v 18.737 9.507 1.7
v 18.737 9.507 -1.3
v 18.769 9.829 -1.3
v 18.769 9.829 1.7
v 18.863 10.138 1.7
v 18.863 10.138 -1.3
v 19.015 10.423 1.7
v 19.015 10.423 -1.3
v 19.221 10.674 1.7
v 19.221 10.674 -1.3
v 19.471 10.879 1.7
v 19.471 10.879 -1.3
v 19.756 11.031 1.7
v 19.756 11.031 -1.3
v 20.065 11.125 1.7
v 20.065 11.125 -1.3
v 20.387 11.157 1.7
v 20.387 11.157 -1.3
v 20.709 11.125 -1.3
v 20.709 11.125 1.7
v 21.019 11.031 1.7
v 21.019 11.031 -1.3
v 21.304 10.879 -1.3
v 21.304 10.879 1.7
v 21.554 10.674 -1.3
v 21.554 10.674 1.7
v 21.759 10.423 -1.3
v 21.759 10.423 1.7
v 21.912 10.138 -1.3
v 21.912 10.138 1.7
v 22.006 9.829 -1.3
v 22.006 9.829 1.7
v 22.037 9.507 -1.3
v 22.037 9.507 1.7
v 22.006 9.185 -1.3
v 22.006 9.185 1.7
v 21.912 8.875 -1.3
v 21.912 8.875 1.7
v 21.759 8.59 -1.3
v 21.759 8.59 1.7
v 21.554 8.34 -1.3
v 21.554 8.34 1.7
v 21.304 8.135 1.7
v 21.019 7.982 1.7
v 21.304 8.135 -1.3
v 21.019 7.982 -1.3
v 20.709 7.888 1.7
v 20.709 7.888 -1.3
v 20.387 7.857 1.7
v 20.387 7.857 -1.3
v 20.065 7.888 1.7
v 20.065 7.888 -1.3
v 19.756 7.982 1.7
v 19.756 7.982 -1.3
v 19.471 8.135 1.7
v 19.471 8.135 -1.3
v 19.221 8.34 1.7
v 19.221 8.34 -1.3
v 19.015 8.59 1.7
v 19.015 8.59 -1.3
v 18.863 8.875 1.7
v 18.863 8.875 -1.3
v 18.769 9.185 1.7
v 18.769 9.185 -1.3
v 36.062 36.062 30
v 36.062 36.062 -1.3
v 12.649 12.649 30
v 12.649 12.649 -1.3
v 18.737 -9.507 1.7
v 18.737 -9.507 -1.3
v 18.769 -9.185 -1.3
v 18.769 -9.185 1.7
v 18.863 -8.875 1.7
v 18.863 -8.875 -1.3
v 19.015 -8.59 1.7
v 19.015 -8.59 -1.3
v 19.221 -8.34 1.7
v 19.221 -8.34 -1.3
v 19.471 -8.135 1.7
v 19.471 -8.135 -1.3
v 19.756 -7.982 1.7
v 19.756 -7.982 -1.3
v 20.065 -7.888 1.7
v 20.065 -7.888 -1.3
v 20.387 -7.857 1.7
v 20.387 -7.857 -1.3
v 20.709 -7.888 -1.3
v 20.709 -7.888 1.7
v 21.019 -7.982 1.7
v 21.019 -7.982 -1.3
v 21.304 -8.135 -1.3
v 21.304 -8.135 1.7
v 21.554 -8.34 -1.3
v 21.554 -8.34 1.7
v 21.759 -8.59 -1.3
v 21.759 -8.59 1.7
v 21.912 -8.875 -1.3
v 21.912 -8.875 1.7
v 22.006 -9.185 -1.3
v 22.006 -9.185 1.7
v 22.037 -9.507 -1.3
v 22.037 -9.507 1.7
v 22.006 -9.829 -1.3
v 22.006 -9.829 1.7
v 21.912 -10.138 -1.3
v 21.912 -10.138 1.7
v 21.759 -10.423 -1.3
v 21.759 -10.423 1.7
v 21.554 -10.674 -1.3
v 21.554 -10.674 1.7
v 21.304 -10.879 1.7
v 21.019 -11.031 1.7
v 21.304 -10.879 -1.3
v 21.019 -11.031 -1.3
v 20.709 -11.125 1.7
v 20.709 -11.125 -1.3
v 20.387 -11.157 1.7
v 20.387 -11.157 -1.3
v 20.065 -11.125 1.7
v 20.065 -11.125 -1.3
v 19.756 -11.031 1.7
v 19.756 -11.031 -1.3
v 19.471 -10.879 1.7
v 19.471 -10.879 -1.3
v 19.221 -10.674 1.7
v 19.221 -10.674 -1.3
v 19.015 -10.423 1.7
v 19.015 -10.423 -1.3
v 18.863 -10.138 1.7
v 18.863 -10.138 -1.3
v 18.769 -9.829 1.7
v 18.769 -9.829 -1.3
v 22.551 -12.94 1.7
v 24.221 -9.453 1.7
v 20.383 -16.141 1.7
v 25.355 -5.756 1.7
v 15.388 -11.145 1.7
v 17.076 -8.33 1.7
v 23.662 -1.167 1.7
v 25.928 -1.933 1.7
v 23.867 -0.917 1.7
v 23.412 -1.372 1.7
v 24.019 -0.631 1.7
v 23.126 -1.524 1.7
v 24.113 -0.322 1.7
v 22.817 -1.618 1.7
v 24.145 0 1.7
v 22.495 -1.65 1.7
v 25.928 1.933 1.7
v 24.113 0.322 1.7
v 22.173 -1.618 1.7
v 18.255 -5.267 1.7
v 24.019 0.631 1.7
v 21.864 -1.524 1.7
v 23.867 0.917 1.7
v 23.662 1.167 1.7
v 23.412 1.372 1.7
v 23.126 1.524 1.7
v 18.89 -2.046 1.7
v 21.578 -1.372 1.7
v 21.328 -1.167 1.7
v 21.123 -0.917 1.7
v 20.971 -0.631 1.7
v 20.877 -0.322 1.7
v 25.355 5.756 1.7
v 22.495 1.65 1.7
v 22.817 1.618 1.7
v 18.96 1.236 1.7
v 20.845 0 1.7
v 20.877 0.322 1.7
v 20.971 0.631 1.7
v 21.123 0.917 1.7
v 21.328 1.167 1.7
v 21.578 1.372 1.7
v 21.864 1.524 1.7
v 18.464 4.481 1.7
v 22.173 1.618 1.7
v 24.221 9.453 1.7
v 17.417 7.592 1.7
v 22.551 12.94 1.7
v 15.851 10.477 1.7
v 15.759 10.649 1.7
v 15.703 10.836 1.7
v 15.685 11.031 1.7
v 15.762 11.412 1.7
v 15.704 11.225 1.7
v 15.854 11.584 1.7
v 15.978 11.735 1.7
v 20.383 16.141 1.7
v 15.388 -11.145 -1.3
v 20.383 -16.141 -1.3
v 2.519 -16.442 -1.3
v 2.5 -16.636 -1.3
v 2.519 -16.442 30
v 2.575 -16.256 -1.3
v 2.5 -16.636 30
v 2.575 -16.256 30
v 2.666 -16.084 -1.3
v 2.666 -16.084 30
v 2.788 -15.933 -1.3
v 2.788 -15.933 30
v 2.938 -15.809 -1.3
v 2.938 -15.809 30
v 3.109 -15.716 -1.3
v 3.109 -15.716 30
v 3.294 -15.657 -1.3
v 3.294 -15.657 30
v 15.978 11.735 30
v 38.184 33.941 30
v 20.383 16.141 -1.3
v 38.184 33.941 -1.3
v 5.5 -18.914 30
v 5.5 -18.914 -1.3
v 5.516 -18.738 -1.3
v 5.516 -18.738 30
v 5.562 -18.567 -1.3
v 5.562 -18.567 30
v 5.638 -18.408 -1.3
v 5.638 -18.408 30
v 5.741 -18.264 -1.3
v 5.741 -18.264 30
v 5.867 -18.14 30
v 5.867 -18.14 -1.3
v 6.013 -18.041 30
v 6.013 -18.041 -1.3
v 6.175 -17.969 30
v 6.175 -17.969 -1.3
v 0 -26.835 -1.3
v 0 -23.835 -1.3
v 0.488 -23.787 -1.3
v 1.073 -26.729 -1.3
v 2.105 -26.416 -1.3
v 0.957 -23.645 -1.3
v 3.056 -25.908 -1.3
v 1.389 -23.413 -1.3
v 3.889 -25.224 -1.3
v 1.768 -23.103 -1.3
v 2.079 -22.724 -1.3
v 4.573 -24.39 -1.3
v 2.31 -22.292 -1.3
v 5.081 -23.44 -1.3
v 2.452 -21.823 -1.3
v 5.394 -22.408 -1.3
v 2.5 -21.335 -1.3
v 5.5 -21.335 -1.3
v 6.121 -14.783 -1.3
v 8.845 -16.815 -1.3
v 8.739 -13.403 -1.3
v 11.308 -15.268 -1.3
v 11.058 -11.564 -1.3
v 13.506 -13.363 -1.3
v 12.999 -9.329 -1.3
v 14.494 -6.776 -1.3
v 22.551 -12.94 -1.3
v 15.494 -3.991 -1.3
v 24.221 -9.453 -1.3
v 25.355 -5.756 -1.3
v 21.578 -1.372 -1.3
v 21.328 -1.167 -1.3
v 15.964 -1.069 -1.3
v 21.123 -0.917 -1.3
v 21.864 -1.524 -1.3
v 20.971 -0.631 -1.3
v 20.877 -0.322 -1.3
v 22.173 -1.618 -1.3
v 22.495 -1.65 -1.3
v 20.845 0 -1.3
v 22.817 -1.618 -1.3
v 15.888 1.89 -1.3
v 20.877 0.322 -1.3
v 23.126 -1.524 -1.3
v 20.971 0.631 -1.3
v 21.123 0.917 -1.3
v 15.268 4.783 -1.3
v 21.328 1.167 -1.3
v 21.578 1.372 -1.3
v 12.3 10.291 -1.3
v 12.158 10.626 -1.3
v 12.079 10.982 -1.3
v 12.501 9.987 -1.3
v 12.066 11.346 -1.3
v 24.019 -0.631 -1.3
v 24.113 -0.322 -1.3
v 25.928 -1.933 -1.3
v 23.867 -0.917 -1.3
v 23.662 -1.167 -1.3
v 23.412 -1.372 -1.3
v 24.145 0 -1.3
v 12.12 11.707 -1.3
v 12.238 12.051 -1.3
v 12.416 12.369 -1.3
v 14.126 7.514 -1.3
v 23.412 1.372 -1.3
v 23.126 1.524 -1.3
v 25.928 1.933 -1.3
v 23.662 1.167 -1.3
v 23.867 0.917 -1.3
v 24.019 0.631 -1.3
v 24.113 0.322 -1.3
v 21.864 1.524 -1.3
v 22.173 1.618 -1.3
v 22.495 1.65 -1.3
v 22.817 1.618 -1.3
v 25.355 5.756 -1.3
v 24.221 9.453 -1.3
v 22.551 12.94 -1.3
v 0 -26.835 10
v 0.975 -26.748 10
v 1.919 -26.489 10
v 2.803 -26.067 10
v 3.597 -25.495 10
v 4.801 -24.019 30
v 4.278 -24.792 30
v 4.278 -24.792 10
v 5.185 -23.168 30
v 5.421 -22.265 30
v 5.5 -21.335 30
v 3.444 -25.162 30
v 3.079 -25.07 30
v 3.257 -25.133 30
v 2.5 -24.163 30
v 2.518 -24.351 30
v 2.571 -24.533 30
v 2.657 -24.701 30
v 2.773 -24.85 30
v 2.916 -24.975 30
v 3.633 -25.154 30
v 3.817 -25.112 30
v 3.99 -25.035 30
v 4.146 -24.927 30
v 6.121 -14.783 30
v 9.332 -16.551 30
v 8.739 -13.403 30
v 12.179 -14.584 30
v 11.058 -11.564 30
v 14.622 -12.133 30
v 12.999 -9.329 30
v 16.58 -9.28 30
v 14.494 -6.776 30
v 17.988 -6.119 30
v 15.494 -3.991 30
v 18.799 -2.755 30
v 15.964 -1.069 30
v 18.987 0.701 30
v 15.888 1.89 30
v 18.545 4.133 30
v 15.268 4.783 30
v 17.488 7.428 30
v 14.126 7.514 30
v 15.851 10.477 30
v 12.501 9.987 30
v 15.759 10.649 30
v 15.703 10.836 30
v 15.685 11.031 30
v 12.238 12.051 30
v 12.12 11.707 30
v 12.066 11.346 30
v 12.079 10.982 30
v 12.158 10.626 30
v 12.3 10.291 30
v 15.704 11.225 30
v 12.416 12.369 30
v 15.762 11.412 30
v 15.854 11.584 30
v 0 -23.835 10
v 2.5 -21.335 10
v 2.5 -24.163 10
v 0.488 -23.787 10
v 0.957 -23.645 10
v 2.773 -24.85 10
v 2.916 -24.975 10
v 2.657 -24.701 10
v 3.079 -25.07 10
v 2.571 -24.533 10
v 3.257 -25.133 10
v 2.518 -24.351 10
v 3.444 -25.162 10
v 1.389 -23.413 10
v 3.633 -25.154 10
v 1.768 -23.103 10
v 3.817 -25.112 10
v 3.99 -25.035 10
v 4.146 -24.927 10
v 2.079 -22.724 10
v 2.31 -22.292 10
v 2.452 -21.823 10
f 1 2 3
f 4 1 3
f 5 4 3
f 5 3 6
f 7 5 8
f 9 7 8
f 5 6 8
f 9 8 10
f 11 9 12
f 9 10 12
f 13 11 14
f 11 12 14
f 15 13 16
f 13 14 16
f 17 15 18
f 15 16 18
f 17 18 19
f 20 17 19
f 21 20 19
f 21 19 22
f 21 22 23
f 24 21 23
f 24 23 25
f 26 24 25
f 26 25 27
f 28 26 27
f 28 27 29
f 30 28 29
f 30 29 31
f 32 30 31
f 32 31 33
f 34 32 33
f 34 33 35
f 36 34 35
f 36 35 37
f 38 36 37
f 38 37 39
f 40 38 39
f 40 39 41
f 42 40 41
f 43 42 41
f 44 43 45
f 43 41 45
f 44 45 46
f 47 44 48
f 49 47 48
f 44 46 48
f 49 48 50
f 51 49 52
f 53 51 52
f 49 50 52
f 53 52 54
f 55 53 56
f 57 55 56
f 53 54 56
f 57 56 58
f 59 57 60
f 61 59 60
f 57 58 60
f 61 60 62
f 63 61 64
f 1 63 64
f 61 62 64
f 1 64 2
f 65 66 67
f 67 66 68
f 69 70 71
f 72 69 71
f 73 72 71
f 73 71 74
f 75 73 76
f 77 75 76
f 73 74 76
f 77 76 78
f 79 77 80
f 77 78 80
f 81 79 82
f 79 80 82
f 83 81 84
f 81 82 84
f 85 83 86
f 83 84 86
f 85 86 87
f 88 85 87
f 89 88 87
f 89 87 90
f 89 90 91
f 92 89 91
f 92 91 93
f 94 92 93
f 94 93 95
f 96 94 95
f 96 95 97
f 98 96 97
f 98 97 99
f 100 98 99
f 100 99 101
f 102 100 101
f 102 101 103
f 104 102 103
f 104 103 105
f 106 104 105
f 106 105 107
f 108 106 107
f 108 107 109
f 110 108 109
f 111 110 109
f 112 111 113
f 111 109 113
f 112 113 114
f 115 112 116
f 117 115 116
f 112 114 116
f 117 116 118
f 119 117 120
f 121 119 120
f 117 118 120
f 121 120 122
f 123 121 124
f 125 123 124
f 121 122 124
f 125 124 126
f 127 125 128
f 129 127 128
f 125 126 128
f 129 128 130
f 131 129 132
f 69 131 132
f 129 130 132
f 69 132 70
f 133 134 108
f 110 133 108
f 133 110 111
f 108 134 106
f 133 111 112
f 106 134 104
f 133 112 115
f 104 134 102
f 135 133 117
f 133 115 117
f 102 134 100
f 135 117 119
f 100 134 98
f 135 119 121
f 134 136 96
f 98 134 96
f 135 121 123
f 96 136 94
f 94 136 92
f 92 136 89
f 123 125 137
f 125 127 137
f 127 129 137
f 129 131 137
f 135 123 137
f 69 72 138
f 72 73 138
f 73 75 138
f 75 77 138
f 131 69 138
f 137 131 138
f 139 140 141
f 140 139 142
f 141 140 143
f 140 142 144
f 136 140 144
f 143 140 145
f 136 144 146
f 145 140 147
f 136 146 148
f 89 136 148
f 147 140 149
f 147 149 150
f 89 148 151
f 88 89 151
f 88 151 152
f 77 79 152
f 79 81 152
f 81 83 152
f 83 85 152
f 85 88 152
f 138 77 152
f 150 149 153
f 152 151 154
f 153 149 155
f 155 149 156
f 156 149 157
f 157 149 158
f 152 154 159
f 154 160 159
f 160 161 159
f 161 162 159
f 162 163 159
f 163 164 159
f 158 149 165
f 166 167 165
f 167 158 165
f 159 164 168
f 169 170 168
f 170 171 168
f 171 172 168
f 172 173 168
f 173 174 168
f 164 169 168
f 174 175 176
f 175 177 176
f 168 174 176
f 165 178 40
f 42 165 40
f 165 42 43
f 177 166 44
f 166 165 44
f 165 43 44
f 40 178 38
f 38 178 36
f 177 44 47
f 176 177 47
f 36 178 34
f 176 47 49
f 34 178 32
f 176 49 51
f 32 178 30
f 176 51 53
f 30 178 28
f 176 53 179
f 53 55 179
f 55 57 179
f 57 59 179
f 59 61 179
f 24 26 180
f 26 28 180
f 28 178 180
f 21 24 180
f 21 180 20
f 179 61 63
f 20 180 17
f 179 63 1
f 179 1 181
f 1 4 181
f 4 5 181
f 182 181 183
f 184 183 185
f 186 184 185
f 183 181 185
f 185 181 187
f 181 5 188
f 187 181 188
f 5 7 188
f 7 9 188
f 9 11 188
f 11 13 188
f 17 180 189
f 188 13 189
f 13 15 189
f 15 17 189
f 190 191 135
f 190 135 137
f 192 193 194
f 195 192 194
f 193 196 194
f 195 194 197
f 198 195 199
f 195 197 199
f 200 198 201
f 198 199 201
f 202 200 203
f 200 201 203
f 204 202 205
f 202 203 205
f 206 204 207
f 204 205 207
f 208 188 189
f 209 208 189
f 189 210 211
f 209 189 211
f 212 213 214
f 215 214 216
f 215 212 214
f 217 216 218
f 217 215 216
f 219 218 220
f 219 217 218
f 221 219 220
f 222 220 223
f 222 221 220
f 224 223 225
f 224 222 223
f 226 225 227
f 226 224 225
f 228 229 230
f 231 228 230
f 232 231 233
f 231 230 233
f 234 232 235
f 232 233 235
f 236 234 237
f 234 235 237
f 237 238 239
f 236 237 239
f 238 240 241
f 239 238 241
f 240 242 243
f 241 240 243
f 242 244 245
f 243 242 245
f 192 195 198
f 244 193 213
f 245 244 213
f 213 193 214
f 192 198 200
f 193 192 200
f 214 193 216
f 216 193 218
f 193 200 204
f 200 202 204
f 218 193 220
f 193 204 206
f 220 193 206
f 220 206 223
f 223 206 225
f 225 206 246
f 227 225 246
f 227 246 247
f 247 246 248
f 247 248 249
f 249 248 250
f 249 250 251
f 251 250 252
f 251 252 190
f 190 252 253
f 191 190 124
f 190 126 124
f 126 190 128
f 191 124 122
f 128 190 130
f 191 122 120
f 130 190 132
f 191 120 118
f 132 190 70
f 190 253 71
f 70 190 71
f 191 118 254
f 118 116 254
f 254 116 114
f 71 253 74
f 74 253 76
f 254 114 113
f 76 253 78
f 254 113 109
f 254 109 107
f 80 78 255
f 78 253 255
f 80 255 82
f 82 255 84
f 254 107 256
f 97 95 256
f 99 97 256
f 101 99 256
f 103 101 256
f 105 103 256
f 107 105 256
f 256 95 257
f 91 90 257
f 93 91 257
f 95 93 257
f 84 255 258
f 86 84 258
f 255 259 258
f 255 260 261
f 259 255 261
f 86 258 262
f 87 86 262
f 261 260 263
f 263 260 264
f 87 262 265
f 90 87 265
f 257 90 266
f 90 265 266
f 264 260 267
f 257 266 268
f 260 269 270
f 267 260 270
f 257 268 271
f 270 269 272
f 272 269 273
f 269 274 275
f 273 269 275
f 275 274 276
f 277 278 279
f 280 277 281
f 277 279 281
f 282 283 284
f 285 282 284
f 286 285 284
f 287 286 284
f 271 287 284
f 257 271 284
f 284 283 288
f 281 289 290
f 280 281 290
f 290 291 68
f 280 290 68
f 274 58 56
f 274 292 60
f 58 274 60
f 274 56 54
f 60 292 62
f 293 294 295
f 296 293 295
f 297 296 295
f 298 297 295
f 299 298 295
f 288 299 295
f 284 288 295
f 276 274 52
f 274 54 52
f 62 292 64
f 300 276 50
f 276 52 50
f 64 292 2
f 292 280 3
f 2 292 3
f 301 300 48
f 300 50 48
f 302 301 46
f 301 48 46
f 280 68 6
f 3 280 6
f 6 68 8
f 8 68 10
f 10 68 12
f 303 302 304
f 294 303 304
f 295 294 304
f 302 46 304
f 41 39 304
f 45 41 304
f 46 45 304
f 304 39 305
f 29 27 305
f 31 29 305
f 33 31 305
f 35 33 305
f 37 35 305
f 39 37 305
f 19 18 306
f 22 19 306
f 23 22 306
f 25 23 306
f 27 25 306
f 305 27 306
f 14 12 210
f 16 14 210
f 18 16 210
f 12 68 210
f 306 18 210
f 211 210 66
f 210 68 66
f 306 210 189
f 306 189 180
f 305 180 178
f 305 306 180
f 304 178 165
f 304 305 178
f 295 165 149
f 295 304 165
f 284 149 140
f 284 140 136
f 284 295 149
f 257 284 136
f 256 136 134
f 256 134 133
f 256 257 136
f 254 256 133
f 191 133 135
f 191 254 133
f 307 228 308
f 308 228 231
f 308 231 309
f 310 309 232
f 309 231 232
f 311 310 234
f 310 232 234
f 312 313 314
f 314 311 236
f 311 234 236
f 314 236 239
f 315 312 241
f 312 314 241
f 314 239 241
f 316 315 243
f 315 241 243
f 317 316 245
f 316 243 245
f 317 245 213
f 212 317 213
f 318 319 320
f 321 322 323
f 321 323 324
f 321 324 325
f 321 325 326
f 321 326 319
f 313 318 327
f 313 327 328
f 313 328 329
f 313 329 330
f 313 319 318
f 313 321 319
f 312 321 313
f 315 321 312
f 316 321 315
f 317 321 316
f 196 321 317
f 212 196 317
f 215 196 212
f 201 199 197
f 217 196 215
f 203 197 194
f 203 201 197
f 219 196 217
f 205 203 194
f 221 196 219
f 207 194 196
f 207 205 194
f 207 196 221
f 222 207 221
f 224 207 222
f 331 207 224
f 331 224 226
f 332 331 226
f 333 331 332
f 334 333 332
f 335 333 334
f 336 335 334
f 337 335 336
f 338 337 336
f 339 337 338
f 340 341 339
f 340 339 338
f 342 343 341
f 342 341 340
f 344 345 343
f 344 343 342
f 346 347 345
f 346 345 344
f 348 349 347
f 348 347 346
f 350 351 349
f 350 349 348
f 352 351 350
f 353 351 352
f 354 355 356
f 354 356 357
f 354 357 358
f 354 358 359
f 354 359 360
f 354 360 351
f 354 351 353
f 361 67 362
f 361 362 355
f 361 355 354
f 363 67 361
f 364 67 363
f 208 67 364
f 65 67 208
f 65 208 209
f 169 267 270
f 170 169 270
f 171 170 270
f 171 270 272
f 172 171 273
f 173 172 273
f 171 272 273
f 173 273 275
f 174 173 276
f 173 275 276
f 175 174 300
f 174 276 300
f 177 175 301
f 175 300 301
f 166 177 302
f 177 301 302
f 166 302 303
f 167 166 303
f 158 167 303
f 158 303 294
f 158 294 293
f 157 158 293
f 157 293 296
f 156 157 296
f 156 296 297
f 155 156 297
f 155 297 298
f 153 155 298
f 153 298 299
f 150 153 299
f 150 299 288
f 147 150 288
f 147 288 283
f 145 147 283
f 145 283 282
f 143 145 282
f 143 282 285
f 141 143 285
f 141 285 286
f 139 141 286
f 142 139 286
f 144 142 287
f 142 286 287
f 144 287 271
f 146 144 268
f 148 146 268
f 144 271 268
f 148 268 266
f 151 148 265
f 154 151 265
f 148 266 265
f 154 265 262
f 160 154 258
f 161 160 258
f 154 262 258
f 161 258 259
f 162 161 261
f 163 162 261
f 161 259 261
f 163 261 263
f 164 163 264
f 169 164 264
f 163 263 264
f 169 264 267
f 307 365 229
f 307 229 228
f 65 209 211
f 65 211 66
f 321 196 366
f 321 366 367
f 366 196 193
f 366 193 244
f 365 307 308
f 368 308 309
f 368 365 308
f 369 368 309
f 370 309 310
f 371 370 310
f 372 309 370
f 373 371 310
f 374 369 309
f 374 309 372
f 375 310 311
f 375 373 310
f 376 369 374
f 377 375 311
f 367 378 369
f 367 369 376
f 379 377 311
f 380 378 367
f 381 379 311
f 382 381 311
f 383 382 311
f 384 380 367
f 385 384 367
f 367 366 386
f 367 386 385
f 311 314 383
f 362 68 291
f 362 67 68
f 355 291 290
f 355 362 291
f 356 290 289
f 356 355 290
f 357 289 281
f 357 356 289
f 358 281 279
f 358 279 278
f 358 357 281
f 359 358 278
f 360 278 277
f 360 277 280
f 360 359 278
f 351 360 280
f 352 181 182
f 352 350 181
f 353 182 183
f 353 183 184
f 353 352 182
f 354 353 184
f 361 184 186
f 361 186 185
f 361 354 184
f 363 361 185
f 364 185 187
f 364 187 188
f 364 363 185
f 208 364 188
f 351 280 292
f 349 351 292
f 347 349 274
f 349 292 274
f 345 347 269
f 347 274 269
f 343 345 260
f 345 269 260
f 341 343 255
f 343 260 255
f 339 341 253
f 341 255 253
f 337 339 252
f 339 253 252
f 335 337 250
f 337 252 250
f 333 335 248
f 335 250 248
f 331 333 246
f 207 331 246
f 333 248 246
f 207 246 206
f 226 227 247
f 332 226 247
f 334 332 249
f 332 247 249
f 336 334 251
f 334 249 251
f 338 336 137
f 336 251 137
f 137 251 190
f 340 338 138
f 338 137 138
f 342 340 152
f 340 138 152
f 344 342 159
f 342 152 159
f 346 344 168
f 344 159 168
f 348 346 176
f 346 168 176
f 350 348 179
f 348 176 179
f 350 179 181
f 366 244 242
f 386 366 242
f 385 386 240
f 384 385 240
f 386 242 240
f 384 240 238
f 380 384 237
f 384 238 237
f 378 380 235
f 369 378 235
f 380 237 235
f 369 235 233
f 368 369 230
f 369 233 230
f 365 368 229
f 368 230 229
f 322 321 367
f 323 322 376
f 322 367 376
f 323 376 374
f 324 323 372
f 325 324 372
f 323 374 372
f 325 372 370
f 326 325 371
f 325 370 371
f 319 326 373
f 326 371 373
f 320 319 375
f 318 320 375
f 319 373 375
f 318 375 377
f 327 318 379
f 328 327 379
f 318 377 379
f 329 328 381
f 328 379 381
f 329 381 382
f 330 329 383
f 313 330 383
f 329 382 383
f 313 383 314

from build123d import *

# Parameters (mm, degrees)
EXTRUDE_1_DEPTH     = 31.3
EXTRUDE_2_DEPTH     = 3
EXTRUDE_3_DEPTH     = 31.3
SKETCH_9_W          = 7.730582044
SKETCH_9_H          = 5.996077833
CUT_EXTRUDE_1_DEPTH = 20
ST2_9_1_D           = 3.3
FILLET_1_R          = 1
FILLET_2_R          = 2


with BuildPart() as part:
    # 草图1 → 凸台-拉伸1 (new body)
    with BuildSketch(Plane.XY.offset(-1.3)):
        with BuildLine():
            Line((36.062445841, 36.062445841), (11.313708499, 11.313708499))
            ThreePointArc((11.313708499, 11.313708499), (15.216442494, -4.945692856), (2.5, -15.803480629))
            Line((2.5, -15.803480629), (2.5, -18.834808202))
            ThreePointArc((2.5, -18.834808202), (17.455469833, -7.50377058), (15.387819505, 11.145178818))
            Line((15.387819505, 11.145178818), (38.183766184, 33.941125497))
            Line((38.183766184, 33.941125497), (36.062445841, 36.062445841))
        make_face()
    extrude(amount=EXTRUDE_1_DEPTH)

    # 草图2 → 凸台-拉伸2 (add)
    with BuildSketch(Plane.XY.offset(-1.3)):
        with BuildLine():
            Line((15.387819505, 11.145178818), (20.383302711, 16.140662024))
            ThreePointArc((20.383302711, 16.140662024), (26, 0), (20.383302711, -16.140662024))
            Line((20.383302711, -16.140662024), (15.387819505, -11.145178818))
            ThreePointArc((15.387819505, -11.145178818), (19, 0), (15.387819505, 11.145178818))
        make_face()
    extrude(amount=EXTRUDE_2_DEPTH)

    # 草图8 → 凸台-拉伸3 (add)
    with BuildSketch(Plane.XY.offset(-1.3)):
        with BuildLine():
            Line((2.5, -18.834808202), (2.5, -21.334808202))
            ThreePointArc((2.5, -21.334808202), (1.767766953, -23.102575155), (0, -23.834808202))
            Line((0, -23.834808202), (0, -26.834808202))
            ThreePointArc((0, -26.834808202), (3.889087297, -25.223895498), (5.5, -21.334808202))
            Line((5.5, -21.334808202), (5.5, -18.186533479))
            ThreePointArc((5.5, -18.186533479), (4.013111639, -18.57134715), (2.5, -18.834808202))
        make_face()
    extrude(amount=EXTRUDE_3_DEPTH)

    # 草图9 → 切除-拉伸1 (cut)
    with BuildSketch(Plane.XY.offset(30)):
        with Locations((-1.365291022, -24.332847119)):
            Rectangle(SKETCH_9_W, SKETCH_9_H)
    extrude(amount=-CUT_EXTRUDE_1_DEPTH, mode=Mode.SUBTRACT)

    # ST2.9 间隙孔1 (through all)
    with Locations(Plane.XY.offset(1.7)):
        with Locations((22.494945516, 0), (20.38734429, 9.506774772), (20.38734429, -9.506774772)):
            Hole(ST2_9_1_D / 2)

    # 圆角1
    fillet_1_edges = [part.edges().sort_by_distance(p)[0] for p in [
        (2.5, -15.803480629, 14.35),
        (15.387819505, 11.145178818, 15.85),
        (5.5, -18.186533479, 14.35),
        (2.5, -26.233787687, 20),
    ]]
    fillet(fillet_1_edges, radius=FILLET_1_R)

    # 圆角2
    fillet_2_edges = [part.edges().sort_by_distance(p)[0] for p in [
        (11.313708499, 11.313708499, 14.35),
    ]]
    fillet(fillet_2_edges, radius=FILLET_2_R)


solid = part.part
